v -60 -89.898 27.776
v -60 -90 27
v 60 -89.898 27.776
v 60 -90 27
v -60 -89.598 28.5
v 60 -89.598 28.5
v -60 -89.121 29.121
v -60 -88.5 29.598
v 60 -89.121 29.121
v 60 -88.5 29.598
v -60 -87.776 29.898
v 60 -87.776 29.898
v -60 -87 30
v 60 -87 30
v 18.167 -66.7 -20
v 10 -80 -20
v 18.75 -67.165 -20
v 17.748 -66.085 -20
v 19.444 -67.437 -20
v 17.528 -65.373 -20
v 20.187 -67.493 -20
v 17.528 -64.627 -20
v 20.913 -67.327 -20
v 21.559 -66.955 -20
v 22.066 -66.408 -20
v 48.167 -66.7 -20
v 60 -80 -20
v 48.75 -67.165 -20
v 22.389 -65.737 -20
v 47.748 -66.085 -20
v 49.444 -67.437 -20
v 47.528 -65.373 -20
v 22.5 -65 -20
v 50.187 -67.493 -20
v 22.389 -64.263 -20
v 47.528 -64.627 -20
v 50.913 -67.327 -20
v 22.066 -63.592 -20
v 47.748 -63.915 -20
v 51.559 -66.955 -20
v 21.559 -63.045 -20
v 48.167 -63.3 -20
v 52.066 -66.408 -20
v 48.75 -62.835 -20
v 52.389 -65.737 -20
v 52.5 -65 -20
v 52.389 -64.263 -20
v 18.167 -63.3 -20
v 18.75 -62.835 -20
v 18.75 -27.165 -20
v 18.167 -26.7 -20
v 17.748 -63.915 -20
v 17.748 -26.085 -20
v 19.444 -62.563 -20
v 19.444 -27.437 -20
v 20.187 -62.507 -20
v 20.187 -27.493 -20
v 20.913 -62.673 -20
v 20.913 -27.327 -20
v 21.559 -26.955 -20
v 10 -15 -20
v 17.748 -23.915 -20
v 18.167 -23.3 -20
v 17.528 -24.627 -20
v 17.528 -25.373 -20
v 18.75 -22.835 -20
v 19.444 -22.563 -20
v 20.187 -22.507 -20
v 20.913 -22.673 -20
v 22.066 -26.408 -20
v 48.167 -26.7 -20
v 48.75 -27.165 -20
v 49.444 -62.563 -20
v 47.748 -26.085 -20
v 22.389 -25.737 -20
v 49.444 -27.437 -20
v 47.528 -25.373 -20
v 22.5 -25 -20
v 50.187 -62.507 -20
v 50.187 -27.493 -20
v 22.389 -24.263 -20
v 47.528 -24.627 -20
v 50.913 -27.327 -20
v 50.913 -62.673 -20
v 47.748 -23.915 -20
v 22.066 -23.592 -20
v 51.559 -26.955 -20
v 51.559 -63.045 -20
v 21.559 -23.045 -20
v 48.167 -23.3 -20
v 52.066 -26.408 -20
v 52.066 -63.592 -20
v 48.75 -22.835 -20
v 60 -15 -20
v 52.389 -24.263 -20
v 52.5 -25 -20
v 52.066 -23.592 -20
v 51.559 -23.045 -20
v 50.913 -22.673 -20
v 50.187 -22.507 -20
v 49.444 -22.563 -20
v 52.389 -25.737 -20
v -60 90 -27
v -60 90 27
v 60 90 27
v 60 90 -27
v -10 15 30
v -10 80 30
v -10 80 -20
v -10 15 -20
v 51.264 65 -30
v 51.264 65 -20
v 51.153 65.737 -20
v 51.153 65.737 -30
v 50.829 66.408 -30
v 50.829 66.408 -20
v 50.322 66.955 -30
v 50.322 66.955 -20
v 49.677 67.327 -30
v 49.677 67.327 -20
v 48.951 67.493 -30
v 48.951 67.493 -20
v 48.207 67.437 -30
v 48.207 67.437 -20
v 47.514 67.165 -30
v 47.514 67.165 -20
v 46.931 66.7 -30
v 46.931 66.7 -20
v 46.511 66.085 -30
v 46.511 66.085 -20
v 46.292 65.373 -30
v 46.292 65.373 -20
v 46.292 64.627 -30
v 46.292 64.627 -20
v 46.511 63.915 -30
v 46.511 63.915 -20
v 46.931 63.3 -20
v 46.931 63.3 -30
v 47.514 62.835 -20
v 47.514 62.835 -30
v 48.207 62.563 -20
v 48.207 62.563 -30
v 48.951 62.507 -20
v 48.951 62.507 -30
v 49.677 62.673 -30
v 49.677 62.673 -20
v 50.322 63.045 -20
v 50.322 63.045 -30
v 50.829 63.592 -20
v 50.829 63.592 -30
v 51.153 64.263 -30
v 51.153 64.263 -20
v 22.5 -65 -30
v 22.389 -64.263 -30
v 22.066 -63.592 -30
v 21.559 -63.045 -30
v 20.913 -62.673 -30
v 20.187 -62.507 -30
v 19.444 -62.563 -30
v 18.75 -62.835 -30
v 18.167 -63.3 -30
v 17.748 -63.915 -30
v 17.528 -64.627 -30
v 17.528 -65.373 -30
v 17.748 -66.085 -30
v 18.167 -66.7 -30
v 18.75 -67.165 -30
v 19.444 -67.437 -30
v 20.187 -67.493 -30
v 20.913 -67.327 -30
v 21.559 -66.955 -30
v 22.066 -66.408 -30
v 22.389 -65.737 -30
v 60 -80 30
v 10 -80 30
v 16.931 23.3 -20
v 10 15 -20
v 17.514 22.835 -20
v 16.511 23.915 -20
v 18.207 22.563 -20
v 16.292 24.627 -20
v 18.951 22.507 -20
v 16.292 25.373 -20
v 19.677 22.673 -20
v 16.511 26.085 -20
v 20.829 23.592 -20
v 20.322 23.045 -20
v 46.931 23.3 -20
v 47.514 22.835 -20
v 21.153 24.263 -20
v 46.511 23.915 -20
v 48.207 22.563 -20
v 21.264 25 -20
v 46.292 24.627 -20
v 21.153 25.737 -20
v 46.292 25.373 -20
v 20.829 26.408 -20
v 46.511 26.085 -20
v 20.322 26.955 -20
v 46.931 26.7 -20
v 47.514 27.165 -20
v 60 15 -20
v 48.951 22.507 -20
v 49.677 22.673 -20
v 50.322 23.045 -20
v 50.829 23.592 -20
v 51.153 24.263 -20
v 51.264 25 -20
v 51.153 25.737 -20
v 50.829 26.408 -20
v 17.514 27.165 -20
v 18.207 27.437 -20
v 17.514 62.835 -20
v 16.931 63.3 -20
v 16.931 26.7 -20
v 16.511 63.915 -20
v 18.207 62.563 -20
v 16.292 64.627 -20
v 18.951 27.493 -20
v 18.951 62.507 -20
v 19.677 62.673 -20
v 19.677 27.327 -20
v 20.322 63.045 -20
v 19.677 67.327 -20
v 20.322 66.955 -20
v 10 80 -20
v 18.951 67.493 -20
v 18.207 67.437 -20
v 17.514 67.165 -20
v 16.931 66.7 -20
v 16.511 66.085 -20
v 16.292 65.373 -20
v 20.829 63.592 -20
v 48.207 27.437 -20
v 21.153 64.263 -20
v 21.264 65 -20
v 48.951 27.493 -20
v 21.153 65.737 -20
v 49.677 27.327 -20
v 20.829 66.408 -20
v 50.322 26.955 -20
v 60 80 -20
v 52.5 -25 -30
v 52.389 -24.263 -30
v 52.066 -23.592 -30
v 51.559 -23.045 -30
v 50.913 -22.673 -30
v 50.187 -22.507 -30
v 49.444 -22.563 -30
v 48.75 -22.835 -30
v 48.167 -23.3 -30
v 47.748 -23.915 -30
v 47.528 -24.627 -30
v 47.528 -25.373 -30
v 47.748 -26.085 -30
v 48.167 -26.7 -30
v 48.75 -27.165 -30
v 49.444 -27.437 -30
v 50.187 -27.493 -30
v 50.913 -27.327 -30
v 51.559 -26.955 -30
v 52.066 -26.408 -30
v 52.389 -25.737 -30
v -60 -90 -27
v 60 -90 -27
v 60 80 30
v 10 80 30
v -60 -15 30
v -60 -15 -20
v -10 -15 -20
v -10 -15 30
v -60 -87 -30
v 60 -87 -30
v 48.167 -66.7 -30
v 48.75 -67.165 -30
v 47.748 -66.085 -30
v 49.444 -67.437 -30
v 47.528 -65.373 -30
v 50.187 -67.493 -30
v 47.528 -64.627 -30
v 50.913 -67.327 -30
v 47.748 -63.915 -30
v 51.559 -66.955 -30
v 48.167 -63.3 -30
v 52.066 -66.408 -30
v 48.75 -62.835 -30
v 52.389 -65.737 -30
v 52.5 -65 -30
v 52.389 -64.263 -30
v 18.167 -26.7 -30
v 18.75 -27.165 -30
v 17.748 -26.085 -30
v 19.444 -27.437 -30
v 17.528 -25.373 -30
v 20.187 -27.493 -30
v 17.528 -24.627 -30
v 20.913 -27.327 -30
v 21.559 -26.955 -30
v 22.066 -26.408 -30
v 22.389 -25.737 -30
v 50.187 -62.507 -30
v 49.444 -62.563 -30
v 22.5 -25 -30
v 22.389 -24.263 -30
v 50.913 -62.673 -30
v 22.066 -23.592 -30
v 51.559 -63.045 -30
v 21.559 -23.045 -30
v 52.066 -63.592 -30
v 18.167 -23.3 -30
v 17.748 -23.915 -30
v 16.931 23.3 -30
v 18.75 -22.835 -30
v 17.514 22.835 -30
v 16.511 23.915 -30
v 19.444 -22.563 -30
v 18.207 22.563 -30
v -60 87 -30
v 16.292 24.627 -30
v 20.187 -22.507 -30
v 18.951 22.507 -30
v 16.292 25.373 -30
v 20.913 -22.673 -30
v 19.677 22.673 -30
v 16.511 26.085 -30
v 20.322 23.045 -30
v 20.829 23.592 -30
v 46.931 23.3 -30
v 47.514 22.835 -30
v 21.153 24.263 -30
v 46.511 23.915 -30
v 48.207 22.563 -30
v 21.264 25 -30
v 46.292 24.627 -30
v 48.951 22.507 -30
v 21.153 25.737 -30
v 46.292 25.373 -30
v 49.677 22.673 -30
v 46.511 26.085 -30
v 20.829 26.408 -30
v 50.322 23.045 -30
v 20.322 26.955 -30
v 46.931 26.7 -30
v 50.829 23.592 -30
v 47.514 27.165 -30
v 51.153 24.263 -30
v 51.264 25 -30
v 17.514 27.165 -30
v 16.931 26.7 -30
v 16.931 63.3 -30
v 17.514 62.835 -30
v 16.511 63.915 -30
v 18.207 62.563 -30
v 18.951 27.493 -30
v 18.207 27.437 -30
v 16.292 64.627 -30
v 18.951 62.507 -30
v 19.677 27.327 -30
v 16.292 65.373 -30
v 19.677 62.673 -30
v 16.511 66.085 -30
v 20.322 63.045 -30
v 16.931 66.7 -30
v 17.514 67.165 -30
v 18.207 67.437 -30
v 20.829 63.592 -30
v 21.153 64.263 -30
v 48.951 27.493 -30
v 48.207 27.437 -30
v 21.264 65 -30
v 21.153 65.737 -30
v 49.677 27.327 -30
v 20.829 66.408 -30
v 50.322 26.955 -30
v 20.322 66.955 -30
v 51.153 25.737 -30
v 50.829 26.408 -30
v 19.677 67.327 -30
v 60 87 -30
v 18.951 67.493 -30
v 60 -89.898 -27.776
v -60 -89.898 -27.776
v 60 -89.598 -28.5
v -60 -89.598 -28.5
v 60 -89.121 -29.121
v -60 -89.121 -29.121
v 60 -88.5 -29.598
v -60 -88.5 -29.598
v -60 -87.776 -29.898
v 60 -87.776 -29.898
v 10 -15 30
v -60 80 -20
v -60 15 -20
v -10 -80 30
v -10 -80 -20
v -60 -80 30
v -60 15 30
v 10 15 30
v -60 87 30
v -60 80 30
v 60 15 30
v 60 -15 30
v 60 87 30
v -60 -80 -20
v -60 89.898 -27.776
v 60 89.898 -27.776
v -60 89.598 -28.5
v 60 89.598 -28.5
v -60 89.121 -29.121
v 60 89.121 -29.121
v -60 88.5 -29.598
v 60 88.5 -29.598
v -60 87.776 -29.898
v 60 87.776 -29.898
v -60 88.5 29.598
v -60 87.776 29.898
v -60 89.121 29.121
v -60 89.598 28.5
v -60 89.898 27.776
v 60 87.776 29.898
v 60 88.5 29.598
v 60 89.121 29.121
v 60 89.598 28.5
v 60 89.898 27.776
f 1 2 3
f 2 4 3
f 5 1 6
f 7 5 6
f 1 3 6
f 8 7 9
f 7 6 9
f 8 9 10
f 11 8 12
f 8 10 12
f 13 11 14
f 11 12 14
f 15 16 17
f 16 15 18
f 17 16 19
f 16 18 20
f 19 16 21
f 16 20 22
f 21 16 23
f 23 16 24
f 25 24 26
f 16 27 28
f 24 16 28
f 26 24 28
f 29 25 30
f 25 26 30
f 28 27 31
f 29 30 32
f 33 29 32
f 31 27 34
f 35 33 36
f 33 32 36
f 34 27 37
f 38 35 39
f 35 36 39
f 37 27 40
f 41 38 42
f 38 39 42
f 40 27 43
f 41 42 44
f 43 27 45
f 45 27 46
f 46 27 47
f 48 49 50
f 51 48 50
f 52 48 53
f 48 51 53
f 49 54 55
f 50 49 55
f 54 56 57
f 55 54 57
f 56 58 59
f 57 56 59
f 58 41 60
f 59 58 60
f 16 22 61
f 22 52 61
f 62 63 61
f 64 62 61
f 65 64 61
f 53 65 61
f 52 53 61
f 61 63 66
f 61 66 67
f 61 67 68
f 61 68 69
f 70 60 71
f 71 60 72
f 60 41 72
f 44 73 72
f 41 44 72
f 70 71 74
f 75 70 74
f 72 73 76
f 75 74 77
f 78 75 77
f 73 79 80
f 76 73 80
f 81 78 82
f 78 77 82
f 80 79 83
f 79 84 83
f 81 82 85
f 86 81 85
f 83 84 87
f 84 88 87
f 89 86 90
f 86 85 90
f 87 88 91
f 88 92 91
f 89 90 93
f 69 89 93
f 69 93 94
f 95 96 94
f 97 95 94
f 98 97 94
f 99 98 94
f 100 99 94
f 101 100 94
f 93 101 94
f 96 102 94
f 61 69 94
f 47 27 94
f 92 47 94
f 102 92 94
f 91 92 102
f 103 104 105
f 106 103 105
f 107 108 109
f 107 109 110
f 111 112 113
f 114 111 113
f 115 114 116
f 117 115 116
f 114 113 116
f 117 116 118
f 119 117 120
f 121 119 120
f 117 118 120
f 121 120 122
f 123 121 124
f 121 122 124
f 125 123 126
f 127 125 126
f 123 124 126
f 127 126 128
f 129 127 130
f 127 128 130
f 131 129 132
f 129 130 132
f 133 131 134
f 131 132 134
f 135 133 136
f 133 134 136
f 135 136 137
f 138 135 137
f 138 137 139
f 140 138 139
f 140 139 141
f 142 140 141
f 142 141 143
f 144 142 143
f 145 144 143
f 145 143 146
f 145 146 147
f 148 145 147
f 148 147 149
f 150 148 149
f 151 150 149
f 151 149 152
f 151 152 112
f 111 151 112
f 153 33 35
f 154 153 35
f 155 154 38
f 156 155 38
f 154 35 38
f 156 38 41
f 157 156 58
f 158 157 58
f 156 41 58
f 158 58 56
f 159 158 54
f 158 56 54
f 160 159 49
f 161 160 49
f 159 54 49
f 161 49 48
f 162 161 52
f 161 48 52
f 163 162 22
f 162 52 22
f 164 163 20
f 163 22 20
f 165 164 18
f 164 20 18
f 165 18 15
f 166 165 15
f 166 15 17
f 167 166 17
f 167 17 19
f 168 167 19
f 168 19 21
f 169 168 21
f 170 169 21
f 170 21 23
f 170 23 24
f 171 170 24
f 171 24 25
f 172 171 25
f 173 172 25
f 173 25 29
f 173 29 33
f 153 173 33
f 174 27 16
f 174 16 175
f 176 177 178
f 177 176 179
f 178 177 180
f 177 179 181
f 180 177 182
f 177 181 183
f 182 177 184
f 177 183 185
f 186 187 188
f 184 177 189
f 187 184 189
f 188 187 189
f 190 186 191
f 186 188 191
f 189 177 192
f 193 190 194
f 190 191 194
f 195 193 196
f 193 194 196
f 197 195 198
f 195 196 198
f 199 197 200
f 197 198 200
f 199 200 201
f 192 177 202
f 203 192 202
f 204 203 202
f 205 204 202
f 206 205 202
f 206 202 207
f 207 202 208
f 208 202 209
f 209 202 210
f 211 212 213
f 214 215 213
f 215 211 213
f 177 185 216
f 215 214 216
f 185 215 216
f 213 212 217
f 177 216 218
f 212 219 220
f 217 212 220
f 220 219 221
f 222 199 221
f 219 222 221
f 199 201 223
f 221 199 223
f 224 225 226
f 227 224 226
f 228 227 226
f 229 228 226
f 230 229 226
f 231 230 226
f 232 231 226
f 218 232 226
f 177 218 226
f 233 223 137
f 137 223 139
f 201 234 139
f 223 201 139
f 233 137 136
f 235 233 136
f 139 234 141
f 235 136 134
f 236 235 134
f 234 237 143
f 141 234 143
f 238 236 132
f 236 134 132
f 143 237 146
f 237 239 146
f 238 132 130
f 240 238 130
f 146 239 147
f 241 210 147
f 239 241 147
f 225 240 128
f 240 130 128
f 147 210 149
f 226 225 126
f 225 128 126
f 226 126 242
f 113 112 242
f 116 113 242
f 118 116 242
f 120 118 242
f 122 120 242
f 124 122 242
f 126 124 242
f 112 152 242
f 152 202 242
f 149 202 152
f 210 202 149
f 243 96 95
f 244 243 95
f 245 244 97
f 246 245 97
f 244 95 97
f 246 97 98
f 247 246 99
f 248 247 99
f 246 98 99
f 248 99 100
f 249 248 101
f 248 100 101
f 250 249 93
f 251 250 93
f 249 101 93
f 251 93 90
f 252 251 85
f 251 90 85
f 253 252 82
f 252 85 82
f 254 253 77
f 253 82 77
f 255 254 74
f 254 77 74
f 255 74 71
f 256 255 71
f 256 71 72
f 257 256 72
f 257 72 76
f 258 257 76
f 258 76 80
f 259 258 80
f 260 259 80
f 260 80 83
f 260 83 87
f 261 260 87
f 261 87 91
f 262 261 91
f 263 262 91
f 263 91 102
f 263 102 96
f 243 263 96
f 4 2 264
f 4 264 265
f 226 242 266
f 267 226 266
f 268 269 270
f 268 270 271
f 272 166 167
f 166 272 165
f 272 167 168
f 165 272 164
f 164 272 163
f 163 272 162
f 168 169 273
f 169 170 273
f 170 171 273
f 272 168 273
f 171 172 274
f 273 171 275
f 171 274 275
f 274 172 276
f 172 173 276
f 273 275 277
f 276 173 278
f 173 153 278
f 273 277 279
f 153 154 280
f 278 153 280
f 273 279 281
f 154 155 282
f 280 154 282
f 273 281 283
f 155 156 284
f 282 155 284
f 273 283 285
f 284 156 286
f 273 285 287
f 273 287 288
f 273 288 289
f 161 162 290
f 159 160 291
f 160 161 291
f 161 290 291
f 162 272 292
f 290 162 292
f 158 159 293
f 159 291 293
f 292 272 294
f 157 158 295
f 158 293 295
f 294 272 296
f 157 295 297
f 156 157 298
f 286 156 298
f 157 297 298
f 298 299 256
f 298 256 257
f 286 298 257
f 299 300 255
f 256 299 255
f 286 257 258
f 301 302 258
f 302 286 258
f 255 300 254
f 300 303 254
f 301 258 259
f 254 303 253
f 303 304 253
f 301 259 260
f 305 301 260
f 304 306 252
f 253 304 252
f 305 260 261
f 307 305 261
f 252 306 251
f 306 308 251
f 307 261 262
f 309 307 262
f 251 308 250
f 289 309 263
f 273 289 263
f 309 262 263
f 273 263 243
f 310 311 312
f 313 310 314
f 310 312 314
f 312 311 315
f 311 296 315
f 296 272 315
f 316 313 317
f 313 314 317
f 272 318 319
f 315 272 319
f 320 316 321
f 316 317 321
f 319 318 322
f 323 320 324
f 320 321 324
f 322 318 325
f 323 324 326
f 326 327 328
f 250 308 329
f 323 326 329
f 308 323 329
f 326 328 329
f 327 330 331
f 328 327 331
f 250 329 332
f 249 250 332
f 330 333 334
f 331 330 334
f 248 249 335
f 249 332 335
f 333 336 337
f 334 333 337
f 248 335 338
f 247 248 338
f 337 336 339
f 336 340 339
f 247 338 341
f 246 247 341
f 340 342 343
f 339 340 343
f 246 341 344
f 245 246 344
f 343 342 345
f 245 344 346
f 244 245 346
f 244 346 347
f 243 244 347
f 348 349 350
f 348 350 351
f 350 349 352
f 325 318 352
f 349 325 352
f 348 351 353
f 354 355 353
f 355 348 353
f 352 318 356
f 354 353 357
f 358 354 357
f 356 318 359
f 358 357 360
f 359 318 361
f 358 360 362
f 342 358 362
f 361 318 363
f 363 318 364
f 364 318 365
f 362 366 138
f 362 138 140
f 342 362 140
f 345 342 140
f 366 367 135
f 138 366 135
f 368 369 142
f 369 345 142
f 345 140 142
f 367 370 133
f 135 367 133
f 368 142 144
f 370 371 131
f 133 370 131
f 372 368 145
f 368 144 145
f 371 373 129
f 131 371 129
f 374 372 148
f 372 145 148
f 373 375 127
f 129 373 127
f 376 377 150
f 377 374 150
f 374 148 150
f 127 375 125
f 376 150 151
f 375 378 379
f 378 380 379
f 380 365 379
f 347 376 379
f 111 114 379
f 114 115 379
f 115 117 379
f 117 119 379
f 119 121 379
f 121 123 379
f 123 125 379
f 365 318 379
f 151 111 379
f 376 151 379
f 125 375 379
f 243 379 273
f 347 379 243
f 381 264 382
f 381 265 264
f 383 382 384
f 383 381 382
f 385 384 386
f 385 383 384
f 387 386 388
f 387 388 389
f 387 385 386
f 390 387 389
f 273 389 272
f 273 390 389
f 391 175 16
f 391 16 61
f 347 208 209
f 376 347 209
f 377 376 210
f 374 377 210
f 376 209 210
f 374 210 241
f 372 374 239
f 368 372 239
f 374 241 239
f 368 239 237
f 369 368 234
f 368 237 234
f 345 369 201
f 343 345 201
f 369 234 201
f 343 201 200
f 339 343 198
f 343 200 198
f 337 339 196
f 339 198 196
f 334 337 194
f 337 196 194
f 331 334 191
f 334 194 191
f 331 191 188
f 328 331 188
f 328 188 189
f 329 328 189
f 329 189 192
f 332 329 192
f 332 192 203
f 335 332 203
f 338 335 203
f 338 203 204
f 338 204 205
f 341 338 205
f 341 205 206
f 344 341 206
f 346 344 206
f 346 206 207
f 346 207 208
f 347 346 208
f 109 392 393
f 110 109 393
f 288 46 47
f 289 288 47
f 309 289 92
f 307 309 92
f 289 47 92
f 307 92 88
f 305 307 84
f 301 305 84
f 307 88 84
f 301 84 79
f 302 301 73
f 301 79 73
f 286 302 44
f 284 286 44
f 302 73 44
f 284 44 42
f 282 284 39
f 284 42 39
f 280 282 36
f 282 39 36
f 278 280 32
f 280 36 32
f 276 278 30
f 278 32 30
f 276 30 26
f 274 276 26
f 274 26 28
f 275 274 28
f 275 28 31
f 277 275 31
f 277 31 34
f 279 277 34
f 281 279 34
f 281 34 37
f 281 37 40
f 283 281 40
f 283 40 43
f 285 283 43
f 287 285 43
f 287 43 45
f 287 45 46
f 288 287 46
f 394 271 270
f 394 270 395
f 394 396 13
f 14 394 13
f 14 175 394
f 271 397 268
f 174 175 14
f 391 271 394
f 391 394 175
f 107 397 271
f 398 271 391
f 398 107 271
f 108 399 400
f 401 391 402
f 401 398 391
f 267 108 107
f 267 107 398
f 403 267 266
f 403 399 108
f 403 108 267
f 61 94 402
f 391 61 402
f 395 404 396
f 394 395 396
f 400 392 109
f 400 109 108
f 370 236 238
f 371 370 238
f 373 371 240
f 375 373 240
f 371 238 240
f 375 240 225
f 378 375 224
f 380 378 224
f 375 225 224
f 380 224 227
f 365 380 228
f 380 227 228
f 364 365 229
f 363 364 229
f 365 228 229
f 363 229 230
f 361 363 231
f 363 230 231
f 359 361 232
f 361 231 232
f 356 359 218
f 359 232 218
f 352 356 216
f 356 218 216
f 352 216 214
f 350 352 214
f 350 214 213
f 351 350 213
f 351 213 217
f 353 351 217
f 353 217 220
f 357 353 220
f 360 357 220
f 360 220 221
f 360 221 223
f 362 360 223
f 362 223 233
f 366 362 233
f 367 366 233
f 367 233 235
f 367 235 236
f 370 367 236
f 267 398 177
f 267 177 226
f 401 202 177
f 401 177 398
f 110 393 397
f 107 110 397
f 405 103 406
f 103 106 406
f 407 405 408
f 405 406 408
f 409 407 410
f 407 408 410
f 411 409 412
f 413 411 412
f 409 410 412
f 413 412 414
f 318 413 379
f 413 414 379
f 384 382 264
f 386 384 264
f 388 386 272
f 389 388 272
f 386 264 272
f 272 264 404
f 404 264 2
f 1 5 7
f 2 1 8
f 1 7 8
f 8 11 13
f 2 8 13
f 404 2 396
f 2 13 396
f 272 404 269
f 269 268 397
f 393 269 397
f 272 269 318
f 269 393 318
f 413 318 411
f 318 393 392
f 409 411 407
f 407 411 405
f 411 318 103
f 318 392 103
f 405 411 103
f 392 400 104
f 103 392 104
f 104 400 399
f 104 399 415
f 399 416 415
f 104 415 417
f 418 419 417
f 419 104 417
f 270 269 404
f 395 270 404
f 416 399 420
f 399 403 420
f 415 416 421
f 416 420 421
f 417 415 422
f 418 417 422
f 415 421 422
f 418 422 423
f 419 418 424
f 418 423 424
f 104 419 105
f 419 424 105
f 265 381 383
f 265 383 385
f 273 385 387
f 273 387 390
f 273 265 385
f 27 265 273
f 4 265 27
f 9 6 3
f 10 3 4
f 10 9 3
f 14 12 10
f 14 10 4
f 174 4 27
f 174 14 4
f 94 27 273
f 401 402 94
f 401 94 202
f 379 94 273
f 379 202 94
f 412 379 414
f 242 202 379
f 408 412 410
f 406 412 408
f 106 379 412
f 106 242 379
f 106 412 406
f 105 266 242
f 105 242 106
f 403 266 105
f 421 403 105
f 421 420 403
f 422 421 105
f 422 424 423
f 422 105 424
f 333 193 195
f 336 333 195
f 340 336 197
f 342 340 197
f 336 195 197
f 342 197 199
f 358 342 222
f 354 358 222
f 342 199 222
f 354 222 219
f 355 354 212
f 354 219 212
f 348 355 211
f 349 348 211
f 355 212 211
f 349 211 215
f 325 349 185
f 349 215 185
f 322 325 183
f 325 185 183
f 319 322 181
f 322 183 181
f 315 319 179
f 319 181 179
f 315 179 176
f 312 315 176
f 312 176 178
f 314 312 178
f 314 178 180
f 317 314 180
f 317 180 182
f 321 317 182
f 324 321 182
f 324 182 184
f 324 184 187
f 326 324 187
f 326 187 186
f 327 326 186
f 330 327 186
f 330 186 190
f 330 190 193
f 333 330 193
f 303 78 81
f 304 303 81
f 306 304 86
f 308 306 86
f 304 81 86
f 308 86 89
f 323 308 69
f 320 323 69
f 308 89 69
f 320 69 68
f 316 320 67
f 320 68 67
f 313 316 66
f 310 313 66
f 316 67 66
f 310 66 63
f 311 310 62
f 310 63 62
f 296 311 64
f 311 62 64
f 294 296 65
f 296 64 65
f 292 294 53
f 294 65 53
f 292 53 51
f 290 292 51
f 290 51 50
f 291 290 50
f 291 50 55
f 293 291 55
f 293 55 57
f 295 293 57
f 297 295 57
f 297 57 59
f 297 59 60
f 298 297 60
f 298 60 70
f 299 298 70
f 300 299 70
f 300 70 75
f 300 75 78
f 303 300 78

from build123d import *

# Parameters (mm, degrees)
F0_W          = 120
F0_H          = 180
F1_DEPTH      = 30
F2_W          = 65
F2_H          = 50
F4_DEPTH      = 50
F3_W          = 65
F3_H          = 50
F5_DEPTH      = 50
F6_R          = 3
F7_R          = 2.5
F8_DEPTH      = 25
F8_DEPTH_BACK = 25


with BuildPart() as f1:
    # F0 (on Top) → F1 (new body, symmetric)
    with BuildSketch(Plane.XY):
        Rectangle(F0_W, F0_H)
    extrude(amount=F1_DEPTH, both=True)

    # F2 (on face) → F4 (cut)
    with BuildSketch(Plane.YZ.offset(60)):
        with Locations((-47.5, 5)):
            Rectangle(F2_W, F2_H)
        with Locations((47.5, 5)):
            Rectangle(F2_W, F2_H)
    extrude(amount=-F4_DEPTH, mode=Mode.SUBTRACT)

    # F3 (on face) → F5 (cut)
    with BuildSketch(Plane(origin=(-60, 0, 0), x_dir=(0, -1, 0), z_dir=(-1, 0, 0))):
        with Locations((-47.5, 5)):
            Rectangle(F3_W, F3_H)
        with Locations((47.5, 5)):
            Rectangle(F3_W, F3_H)
    extrude(amount=-F5_DEPTH, mode=Mode.SUBTRACT)

    # F6
    f6_edges = [f1.edges().sort_by_distance(p)[0] for p in [
        (0, -90, 30),
        (0, 90, 30),
        (0, -90, -30),
        (0, 90, -30),
    ]]
    fillet(f6_edges, radius=F6_R)

    # F7 (on face) → F8 (cut, two sides)
    with BuildSketch(Plane.XY.offset(-20)) as f8_sk:
        with Locations((50, -65)):
            Circle(F7_R)
        with Locations((50, -25)):
            Circle(F7_R)
        with Locations((20, -65)):
            Circle(F7_R)
        with Locations((20, -25)):
            Circle(F7_R)
        with Locations((48.7637452036, 25)):
            Circle(F7_R)
        with Locations((18.7637452036, 25)):
            Circle(F7_R)
        with Locations((18.7637452036, 65)):
            Circle(F7_R)
        with Locations((48.7637452036, 65)):
            Circle(F7_R)
    extrude(amount=-F8_DEPTH, mode=Mode.SUBTRACT)
    extrude(f8_sk.sketch, amount=F8_DEPTH_BACK, mode=Mode.SUBTRACT)


solid = f1.part
